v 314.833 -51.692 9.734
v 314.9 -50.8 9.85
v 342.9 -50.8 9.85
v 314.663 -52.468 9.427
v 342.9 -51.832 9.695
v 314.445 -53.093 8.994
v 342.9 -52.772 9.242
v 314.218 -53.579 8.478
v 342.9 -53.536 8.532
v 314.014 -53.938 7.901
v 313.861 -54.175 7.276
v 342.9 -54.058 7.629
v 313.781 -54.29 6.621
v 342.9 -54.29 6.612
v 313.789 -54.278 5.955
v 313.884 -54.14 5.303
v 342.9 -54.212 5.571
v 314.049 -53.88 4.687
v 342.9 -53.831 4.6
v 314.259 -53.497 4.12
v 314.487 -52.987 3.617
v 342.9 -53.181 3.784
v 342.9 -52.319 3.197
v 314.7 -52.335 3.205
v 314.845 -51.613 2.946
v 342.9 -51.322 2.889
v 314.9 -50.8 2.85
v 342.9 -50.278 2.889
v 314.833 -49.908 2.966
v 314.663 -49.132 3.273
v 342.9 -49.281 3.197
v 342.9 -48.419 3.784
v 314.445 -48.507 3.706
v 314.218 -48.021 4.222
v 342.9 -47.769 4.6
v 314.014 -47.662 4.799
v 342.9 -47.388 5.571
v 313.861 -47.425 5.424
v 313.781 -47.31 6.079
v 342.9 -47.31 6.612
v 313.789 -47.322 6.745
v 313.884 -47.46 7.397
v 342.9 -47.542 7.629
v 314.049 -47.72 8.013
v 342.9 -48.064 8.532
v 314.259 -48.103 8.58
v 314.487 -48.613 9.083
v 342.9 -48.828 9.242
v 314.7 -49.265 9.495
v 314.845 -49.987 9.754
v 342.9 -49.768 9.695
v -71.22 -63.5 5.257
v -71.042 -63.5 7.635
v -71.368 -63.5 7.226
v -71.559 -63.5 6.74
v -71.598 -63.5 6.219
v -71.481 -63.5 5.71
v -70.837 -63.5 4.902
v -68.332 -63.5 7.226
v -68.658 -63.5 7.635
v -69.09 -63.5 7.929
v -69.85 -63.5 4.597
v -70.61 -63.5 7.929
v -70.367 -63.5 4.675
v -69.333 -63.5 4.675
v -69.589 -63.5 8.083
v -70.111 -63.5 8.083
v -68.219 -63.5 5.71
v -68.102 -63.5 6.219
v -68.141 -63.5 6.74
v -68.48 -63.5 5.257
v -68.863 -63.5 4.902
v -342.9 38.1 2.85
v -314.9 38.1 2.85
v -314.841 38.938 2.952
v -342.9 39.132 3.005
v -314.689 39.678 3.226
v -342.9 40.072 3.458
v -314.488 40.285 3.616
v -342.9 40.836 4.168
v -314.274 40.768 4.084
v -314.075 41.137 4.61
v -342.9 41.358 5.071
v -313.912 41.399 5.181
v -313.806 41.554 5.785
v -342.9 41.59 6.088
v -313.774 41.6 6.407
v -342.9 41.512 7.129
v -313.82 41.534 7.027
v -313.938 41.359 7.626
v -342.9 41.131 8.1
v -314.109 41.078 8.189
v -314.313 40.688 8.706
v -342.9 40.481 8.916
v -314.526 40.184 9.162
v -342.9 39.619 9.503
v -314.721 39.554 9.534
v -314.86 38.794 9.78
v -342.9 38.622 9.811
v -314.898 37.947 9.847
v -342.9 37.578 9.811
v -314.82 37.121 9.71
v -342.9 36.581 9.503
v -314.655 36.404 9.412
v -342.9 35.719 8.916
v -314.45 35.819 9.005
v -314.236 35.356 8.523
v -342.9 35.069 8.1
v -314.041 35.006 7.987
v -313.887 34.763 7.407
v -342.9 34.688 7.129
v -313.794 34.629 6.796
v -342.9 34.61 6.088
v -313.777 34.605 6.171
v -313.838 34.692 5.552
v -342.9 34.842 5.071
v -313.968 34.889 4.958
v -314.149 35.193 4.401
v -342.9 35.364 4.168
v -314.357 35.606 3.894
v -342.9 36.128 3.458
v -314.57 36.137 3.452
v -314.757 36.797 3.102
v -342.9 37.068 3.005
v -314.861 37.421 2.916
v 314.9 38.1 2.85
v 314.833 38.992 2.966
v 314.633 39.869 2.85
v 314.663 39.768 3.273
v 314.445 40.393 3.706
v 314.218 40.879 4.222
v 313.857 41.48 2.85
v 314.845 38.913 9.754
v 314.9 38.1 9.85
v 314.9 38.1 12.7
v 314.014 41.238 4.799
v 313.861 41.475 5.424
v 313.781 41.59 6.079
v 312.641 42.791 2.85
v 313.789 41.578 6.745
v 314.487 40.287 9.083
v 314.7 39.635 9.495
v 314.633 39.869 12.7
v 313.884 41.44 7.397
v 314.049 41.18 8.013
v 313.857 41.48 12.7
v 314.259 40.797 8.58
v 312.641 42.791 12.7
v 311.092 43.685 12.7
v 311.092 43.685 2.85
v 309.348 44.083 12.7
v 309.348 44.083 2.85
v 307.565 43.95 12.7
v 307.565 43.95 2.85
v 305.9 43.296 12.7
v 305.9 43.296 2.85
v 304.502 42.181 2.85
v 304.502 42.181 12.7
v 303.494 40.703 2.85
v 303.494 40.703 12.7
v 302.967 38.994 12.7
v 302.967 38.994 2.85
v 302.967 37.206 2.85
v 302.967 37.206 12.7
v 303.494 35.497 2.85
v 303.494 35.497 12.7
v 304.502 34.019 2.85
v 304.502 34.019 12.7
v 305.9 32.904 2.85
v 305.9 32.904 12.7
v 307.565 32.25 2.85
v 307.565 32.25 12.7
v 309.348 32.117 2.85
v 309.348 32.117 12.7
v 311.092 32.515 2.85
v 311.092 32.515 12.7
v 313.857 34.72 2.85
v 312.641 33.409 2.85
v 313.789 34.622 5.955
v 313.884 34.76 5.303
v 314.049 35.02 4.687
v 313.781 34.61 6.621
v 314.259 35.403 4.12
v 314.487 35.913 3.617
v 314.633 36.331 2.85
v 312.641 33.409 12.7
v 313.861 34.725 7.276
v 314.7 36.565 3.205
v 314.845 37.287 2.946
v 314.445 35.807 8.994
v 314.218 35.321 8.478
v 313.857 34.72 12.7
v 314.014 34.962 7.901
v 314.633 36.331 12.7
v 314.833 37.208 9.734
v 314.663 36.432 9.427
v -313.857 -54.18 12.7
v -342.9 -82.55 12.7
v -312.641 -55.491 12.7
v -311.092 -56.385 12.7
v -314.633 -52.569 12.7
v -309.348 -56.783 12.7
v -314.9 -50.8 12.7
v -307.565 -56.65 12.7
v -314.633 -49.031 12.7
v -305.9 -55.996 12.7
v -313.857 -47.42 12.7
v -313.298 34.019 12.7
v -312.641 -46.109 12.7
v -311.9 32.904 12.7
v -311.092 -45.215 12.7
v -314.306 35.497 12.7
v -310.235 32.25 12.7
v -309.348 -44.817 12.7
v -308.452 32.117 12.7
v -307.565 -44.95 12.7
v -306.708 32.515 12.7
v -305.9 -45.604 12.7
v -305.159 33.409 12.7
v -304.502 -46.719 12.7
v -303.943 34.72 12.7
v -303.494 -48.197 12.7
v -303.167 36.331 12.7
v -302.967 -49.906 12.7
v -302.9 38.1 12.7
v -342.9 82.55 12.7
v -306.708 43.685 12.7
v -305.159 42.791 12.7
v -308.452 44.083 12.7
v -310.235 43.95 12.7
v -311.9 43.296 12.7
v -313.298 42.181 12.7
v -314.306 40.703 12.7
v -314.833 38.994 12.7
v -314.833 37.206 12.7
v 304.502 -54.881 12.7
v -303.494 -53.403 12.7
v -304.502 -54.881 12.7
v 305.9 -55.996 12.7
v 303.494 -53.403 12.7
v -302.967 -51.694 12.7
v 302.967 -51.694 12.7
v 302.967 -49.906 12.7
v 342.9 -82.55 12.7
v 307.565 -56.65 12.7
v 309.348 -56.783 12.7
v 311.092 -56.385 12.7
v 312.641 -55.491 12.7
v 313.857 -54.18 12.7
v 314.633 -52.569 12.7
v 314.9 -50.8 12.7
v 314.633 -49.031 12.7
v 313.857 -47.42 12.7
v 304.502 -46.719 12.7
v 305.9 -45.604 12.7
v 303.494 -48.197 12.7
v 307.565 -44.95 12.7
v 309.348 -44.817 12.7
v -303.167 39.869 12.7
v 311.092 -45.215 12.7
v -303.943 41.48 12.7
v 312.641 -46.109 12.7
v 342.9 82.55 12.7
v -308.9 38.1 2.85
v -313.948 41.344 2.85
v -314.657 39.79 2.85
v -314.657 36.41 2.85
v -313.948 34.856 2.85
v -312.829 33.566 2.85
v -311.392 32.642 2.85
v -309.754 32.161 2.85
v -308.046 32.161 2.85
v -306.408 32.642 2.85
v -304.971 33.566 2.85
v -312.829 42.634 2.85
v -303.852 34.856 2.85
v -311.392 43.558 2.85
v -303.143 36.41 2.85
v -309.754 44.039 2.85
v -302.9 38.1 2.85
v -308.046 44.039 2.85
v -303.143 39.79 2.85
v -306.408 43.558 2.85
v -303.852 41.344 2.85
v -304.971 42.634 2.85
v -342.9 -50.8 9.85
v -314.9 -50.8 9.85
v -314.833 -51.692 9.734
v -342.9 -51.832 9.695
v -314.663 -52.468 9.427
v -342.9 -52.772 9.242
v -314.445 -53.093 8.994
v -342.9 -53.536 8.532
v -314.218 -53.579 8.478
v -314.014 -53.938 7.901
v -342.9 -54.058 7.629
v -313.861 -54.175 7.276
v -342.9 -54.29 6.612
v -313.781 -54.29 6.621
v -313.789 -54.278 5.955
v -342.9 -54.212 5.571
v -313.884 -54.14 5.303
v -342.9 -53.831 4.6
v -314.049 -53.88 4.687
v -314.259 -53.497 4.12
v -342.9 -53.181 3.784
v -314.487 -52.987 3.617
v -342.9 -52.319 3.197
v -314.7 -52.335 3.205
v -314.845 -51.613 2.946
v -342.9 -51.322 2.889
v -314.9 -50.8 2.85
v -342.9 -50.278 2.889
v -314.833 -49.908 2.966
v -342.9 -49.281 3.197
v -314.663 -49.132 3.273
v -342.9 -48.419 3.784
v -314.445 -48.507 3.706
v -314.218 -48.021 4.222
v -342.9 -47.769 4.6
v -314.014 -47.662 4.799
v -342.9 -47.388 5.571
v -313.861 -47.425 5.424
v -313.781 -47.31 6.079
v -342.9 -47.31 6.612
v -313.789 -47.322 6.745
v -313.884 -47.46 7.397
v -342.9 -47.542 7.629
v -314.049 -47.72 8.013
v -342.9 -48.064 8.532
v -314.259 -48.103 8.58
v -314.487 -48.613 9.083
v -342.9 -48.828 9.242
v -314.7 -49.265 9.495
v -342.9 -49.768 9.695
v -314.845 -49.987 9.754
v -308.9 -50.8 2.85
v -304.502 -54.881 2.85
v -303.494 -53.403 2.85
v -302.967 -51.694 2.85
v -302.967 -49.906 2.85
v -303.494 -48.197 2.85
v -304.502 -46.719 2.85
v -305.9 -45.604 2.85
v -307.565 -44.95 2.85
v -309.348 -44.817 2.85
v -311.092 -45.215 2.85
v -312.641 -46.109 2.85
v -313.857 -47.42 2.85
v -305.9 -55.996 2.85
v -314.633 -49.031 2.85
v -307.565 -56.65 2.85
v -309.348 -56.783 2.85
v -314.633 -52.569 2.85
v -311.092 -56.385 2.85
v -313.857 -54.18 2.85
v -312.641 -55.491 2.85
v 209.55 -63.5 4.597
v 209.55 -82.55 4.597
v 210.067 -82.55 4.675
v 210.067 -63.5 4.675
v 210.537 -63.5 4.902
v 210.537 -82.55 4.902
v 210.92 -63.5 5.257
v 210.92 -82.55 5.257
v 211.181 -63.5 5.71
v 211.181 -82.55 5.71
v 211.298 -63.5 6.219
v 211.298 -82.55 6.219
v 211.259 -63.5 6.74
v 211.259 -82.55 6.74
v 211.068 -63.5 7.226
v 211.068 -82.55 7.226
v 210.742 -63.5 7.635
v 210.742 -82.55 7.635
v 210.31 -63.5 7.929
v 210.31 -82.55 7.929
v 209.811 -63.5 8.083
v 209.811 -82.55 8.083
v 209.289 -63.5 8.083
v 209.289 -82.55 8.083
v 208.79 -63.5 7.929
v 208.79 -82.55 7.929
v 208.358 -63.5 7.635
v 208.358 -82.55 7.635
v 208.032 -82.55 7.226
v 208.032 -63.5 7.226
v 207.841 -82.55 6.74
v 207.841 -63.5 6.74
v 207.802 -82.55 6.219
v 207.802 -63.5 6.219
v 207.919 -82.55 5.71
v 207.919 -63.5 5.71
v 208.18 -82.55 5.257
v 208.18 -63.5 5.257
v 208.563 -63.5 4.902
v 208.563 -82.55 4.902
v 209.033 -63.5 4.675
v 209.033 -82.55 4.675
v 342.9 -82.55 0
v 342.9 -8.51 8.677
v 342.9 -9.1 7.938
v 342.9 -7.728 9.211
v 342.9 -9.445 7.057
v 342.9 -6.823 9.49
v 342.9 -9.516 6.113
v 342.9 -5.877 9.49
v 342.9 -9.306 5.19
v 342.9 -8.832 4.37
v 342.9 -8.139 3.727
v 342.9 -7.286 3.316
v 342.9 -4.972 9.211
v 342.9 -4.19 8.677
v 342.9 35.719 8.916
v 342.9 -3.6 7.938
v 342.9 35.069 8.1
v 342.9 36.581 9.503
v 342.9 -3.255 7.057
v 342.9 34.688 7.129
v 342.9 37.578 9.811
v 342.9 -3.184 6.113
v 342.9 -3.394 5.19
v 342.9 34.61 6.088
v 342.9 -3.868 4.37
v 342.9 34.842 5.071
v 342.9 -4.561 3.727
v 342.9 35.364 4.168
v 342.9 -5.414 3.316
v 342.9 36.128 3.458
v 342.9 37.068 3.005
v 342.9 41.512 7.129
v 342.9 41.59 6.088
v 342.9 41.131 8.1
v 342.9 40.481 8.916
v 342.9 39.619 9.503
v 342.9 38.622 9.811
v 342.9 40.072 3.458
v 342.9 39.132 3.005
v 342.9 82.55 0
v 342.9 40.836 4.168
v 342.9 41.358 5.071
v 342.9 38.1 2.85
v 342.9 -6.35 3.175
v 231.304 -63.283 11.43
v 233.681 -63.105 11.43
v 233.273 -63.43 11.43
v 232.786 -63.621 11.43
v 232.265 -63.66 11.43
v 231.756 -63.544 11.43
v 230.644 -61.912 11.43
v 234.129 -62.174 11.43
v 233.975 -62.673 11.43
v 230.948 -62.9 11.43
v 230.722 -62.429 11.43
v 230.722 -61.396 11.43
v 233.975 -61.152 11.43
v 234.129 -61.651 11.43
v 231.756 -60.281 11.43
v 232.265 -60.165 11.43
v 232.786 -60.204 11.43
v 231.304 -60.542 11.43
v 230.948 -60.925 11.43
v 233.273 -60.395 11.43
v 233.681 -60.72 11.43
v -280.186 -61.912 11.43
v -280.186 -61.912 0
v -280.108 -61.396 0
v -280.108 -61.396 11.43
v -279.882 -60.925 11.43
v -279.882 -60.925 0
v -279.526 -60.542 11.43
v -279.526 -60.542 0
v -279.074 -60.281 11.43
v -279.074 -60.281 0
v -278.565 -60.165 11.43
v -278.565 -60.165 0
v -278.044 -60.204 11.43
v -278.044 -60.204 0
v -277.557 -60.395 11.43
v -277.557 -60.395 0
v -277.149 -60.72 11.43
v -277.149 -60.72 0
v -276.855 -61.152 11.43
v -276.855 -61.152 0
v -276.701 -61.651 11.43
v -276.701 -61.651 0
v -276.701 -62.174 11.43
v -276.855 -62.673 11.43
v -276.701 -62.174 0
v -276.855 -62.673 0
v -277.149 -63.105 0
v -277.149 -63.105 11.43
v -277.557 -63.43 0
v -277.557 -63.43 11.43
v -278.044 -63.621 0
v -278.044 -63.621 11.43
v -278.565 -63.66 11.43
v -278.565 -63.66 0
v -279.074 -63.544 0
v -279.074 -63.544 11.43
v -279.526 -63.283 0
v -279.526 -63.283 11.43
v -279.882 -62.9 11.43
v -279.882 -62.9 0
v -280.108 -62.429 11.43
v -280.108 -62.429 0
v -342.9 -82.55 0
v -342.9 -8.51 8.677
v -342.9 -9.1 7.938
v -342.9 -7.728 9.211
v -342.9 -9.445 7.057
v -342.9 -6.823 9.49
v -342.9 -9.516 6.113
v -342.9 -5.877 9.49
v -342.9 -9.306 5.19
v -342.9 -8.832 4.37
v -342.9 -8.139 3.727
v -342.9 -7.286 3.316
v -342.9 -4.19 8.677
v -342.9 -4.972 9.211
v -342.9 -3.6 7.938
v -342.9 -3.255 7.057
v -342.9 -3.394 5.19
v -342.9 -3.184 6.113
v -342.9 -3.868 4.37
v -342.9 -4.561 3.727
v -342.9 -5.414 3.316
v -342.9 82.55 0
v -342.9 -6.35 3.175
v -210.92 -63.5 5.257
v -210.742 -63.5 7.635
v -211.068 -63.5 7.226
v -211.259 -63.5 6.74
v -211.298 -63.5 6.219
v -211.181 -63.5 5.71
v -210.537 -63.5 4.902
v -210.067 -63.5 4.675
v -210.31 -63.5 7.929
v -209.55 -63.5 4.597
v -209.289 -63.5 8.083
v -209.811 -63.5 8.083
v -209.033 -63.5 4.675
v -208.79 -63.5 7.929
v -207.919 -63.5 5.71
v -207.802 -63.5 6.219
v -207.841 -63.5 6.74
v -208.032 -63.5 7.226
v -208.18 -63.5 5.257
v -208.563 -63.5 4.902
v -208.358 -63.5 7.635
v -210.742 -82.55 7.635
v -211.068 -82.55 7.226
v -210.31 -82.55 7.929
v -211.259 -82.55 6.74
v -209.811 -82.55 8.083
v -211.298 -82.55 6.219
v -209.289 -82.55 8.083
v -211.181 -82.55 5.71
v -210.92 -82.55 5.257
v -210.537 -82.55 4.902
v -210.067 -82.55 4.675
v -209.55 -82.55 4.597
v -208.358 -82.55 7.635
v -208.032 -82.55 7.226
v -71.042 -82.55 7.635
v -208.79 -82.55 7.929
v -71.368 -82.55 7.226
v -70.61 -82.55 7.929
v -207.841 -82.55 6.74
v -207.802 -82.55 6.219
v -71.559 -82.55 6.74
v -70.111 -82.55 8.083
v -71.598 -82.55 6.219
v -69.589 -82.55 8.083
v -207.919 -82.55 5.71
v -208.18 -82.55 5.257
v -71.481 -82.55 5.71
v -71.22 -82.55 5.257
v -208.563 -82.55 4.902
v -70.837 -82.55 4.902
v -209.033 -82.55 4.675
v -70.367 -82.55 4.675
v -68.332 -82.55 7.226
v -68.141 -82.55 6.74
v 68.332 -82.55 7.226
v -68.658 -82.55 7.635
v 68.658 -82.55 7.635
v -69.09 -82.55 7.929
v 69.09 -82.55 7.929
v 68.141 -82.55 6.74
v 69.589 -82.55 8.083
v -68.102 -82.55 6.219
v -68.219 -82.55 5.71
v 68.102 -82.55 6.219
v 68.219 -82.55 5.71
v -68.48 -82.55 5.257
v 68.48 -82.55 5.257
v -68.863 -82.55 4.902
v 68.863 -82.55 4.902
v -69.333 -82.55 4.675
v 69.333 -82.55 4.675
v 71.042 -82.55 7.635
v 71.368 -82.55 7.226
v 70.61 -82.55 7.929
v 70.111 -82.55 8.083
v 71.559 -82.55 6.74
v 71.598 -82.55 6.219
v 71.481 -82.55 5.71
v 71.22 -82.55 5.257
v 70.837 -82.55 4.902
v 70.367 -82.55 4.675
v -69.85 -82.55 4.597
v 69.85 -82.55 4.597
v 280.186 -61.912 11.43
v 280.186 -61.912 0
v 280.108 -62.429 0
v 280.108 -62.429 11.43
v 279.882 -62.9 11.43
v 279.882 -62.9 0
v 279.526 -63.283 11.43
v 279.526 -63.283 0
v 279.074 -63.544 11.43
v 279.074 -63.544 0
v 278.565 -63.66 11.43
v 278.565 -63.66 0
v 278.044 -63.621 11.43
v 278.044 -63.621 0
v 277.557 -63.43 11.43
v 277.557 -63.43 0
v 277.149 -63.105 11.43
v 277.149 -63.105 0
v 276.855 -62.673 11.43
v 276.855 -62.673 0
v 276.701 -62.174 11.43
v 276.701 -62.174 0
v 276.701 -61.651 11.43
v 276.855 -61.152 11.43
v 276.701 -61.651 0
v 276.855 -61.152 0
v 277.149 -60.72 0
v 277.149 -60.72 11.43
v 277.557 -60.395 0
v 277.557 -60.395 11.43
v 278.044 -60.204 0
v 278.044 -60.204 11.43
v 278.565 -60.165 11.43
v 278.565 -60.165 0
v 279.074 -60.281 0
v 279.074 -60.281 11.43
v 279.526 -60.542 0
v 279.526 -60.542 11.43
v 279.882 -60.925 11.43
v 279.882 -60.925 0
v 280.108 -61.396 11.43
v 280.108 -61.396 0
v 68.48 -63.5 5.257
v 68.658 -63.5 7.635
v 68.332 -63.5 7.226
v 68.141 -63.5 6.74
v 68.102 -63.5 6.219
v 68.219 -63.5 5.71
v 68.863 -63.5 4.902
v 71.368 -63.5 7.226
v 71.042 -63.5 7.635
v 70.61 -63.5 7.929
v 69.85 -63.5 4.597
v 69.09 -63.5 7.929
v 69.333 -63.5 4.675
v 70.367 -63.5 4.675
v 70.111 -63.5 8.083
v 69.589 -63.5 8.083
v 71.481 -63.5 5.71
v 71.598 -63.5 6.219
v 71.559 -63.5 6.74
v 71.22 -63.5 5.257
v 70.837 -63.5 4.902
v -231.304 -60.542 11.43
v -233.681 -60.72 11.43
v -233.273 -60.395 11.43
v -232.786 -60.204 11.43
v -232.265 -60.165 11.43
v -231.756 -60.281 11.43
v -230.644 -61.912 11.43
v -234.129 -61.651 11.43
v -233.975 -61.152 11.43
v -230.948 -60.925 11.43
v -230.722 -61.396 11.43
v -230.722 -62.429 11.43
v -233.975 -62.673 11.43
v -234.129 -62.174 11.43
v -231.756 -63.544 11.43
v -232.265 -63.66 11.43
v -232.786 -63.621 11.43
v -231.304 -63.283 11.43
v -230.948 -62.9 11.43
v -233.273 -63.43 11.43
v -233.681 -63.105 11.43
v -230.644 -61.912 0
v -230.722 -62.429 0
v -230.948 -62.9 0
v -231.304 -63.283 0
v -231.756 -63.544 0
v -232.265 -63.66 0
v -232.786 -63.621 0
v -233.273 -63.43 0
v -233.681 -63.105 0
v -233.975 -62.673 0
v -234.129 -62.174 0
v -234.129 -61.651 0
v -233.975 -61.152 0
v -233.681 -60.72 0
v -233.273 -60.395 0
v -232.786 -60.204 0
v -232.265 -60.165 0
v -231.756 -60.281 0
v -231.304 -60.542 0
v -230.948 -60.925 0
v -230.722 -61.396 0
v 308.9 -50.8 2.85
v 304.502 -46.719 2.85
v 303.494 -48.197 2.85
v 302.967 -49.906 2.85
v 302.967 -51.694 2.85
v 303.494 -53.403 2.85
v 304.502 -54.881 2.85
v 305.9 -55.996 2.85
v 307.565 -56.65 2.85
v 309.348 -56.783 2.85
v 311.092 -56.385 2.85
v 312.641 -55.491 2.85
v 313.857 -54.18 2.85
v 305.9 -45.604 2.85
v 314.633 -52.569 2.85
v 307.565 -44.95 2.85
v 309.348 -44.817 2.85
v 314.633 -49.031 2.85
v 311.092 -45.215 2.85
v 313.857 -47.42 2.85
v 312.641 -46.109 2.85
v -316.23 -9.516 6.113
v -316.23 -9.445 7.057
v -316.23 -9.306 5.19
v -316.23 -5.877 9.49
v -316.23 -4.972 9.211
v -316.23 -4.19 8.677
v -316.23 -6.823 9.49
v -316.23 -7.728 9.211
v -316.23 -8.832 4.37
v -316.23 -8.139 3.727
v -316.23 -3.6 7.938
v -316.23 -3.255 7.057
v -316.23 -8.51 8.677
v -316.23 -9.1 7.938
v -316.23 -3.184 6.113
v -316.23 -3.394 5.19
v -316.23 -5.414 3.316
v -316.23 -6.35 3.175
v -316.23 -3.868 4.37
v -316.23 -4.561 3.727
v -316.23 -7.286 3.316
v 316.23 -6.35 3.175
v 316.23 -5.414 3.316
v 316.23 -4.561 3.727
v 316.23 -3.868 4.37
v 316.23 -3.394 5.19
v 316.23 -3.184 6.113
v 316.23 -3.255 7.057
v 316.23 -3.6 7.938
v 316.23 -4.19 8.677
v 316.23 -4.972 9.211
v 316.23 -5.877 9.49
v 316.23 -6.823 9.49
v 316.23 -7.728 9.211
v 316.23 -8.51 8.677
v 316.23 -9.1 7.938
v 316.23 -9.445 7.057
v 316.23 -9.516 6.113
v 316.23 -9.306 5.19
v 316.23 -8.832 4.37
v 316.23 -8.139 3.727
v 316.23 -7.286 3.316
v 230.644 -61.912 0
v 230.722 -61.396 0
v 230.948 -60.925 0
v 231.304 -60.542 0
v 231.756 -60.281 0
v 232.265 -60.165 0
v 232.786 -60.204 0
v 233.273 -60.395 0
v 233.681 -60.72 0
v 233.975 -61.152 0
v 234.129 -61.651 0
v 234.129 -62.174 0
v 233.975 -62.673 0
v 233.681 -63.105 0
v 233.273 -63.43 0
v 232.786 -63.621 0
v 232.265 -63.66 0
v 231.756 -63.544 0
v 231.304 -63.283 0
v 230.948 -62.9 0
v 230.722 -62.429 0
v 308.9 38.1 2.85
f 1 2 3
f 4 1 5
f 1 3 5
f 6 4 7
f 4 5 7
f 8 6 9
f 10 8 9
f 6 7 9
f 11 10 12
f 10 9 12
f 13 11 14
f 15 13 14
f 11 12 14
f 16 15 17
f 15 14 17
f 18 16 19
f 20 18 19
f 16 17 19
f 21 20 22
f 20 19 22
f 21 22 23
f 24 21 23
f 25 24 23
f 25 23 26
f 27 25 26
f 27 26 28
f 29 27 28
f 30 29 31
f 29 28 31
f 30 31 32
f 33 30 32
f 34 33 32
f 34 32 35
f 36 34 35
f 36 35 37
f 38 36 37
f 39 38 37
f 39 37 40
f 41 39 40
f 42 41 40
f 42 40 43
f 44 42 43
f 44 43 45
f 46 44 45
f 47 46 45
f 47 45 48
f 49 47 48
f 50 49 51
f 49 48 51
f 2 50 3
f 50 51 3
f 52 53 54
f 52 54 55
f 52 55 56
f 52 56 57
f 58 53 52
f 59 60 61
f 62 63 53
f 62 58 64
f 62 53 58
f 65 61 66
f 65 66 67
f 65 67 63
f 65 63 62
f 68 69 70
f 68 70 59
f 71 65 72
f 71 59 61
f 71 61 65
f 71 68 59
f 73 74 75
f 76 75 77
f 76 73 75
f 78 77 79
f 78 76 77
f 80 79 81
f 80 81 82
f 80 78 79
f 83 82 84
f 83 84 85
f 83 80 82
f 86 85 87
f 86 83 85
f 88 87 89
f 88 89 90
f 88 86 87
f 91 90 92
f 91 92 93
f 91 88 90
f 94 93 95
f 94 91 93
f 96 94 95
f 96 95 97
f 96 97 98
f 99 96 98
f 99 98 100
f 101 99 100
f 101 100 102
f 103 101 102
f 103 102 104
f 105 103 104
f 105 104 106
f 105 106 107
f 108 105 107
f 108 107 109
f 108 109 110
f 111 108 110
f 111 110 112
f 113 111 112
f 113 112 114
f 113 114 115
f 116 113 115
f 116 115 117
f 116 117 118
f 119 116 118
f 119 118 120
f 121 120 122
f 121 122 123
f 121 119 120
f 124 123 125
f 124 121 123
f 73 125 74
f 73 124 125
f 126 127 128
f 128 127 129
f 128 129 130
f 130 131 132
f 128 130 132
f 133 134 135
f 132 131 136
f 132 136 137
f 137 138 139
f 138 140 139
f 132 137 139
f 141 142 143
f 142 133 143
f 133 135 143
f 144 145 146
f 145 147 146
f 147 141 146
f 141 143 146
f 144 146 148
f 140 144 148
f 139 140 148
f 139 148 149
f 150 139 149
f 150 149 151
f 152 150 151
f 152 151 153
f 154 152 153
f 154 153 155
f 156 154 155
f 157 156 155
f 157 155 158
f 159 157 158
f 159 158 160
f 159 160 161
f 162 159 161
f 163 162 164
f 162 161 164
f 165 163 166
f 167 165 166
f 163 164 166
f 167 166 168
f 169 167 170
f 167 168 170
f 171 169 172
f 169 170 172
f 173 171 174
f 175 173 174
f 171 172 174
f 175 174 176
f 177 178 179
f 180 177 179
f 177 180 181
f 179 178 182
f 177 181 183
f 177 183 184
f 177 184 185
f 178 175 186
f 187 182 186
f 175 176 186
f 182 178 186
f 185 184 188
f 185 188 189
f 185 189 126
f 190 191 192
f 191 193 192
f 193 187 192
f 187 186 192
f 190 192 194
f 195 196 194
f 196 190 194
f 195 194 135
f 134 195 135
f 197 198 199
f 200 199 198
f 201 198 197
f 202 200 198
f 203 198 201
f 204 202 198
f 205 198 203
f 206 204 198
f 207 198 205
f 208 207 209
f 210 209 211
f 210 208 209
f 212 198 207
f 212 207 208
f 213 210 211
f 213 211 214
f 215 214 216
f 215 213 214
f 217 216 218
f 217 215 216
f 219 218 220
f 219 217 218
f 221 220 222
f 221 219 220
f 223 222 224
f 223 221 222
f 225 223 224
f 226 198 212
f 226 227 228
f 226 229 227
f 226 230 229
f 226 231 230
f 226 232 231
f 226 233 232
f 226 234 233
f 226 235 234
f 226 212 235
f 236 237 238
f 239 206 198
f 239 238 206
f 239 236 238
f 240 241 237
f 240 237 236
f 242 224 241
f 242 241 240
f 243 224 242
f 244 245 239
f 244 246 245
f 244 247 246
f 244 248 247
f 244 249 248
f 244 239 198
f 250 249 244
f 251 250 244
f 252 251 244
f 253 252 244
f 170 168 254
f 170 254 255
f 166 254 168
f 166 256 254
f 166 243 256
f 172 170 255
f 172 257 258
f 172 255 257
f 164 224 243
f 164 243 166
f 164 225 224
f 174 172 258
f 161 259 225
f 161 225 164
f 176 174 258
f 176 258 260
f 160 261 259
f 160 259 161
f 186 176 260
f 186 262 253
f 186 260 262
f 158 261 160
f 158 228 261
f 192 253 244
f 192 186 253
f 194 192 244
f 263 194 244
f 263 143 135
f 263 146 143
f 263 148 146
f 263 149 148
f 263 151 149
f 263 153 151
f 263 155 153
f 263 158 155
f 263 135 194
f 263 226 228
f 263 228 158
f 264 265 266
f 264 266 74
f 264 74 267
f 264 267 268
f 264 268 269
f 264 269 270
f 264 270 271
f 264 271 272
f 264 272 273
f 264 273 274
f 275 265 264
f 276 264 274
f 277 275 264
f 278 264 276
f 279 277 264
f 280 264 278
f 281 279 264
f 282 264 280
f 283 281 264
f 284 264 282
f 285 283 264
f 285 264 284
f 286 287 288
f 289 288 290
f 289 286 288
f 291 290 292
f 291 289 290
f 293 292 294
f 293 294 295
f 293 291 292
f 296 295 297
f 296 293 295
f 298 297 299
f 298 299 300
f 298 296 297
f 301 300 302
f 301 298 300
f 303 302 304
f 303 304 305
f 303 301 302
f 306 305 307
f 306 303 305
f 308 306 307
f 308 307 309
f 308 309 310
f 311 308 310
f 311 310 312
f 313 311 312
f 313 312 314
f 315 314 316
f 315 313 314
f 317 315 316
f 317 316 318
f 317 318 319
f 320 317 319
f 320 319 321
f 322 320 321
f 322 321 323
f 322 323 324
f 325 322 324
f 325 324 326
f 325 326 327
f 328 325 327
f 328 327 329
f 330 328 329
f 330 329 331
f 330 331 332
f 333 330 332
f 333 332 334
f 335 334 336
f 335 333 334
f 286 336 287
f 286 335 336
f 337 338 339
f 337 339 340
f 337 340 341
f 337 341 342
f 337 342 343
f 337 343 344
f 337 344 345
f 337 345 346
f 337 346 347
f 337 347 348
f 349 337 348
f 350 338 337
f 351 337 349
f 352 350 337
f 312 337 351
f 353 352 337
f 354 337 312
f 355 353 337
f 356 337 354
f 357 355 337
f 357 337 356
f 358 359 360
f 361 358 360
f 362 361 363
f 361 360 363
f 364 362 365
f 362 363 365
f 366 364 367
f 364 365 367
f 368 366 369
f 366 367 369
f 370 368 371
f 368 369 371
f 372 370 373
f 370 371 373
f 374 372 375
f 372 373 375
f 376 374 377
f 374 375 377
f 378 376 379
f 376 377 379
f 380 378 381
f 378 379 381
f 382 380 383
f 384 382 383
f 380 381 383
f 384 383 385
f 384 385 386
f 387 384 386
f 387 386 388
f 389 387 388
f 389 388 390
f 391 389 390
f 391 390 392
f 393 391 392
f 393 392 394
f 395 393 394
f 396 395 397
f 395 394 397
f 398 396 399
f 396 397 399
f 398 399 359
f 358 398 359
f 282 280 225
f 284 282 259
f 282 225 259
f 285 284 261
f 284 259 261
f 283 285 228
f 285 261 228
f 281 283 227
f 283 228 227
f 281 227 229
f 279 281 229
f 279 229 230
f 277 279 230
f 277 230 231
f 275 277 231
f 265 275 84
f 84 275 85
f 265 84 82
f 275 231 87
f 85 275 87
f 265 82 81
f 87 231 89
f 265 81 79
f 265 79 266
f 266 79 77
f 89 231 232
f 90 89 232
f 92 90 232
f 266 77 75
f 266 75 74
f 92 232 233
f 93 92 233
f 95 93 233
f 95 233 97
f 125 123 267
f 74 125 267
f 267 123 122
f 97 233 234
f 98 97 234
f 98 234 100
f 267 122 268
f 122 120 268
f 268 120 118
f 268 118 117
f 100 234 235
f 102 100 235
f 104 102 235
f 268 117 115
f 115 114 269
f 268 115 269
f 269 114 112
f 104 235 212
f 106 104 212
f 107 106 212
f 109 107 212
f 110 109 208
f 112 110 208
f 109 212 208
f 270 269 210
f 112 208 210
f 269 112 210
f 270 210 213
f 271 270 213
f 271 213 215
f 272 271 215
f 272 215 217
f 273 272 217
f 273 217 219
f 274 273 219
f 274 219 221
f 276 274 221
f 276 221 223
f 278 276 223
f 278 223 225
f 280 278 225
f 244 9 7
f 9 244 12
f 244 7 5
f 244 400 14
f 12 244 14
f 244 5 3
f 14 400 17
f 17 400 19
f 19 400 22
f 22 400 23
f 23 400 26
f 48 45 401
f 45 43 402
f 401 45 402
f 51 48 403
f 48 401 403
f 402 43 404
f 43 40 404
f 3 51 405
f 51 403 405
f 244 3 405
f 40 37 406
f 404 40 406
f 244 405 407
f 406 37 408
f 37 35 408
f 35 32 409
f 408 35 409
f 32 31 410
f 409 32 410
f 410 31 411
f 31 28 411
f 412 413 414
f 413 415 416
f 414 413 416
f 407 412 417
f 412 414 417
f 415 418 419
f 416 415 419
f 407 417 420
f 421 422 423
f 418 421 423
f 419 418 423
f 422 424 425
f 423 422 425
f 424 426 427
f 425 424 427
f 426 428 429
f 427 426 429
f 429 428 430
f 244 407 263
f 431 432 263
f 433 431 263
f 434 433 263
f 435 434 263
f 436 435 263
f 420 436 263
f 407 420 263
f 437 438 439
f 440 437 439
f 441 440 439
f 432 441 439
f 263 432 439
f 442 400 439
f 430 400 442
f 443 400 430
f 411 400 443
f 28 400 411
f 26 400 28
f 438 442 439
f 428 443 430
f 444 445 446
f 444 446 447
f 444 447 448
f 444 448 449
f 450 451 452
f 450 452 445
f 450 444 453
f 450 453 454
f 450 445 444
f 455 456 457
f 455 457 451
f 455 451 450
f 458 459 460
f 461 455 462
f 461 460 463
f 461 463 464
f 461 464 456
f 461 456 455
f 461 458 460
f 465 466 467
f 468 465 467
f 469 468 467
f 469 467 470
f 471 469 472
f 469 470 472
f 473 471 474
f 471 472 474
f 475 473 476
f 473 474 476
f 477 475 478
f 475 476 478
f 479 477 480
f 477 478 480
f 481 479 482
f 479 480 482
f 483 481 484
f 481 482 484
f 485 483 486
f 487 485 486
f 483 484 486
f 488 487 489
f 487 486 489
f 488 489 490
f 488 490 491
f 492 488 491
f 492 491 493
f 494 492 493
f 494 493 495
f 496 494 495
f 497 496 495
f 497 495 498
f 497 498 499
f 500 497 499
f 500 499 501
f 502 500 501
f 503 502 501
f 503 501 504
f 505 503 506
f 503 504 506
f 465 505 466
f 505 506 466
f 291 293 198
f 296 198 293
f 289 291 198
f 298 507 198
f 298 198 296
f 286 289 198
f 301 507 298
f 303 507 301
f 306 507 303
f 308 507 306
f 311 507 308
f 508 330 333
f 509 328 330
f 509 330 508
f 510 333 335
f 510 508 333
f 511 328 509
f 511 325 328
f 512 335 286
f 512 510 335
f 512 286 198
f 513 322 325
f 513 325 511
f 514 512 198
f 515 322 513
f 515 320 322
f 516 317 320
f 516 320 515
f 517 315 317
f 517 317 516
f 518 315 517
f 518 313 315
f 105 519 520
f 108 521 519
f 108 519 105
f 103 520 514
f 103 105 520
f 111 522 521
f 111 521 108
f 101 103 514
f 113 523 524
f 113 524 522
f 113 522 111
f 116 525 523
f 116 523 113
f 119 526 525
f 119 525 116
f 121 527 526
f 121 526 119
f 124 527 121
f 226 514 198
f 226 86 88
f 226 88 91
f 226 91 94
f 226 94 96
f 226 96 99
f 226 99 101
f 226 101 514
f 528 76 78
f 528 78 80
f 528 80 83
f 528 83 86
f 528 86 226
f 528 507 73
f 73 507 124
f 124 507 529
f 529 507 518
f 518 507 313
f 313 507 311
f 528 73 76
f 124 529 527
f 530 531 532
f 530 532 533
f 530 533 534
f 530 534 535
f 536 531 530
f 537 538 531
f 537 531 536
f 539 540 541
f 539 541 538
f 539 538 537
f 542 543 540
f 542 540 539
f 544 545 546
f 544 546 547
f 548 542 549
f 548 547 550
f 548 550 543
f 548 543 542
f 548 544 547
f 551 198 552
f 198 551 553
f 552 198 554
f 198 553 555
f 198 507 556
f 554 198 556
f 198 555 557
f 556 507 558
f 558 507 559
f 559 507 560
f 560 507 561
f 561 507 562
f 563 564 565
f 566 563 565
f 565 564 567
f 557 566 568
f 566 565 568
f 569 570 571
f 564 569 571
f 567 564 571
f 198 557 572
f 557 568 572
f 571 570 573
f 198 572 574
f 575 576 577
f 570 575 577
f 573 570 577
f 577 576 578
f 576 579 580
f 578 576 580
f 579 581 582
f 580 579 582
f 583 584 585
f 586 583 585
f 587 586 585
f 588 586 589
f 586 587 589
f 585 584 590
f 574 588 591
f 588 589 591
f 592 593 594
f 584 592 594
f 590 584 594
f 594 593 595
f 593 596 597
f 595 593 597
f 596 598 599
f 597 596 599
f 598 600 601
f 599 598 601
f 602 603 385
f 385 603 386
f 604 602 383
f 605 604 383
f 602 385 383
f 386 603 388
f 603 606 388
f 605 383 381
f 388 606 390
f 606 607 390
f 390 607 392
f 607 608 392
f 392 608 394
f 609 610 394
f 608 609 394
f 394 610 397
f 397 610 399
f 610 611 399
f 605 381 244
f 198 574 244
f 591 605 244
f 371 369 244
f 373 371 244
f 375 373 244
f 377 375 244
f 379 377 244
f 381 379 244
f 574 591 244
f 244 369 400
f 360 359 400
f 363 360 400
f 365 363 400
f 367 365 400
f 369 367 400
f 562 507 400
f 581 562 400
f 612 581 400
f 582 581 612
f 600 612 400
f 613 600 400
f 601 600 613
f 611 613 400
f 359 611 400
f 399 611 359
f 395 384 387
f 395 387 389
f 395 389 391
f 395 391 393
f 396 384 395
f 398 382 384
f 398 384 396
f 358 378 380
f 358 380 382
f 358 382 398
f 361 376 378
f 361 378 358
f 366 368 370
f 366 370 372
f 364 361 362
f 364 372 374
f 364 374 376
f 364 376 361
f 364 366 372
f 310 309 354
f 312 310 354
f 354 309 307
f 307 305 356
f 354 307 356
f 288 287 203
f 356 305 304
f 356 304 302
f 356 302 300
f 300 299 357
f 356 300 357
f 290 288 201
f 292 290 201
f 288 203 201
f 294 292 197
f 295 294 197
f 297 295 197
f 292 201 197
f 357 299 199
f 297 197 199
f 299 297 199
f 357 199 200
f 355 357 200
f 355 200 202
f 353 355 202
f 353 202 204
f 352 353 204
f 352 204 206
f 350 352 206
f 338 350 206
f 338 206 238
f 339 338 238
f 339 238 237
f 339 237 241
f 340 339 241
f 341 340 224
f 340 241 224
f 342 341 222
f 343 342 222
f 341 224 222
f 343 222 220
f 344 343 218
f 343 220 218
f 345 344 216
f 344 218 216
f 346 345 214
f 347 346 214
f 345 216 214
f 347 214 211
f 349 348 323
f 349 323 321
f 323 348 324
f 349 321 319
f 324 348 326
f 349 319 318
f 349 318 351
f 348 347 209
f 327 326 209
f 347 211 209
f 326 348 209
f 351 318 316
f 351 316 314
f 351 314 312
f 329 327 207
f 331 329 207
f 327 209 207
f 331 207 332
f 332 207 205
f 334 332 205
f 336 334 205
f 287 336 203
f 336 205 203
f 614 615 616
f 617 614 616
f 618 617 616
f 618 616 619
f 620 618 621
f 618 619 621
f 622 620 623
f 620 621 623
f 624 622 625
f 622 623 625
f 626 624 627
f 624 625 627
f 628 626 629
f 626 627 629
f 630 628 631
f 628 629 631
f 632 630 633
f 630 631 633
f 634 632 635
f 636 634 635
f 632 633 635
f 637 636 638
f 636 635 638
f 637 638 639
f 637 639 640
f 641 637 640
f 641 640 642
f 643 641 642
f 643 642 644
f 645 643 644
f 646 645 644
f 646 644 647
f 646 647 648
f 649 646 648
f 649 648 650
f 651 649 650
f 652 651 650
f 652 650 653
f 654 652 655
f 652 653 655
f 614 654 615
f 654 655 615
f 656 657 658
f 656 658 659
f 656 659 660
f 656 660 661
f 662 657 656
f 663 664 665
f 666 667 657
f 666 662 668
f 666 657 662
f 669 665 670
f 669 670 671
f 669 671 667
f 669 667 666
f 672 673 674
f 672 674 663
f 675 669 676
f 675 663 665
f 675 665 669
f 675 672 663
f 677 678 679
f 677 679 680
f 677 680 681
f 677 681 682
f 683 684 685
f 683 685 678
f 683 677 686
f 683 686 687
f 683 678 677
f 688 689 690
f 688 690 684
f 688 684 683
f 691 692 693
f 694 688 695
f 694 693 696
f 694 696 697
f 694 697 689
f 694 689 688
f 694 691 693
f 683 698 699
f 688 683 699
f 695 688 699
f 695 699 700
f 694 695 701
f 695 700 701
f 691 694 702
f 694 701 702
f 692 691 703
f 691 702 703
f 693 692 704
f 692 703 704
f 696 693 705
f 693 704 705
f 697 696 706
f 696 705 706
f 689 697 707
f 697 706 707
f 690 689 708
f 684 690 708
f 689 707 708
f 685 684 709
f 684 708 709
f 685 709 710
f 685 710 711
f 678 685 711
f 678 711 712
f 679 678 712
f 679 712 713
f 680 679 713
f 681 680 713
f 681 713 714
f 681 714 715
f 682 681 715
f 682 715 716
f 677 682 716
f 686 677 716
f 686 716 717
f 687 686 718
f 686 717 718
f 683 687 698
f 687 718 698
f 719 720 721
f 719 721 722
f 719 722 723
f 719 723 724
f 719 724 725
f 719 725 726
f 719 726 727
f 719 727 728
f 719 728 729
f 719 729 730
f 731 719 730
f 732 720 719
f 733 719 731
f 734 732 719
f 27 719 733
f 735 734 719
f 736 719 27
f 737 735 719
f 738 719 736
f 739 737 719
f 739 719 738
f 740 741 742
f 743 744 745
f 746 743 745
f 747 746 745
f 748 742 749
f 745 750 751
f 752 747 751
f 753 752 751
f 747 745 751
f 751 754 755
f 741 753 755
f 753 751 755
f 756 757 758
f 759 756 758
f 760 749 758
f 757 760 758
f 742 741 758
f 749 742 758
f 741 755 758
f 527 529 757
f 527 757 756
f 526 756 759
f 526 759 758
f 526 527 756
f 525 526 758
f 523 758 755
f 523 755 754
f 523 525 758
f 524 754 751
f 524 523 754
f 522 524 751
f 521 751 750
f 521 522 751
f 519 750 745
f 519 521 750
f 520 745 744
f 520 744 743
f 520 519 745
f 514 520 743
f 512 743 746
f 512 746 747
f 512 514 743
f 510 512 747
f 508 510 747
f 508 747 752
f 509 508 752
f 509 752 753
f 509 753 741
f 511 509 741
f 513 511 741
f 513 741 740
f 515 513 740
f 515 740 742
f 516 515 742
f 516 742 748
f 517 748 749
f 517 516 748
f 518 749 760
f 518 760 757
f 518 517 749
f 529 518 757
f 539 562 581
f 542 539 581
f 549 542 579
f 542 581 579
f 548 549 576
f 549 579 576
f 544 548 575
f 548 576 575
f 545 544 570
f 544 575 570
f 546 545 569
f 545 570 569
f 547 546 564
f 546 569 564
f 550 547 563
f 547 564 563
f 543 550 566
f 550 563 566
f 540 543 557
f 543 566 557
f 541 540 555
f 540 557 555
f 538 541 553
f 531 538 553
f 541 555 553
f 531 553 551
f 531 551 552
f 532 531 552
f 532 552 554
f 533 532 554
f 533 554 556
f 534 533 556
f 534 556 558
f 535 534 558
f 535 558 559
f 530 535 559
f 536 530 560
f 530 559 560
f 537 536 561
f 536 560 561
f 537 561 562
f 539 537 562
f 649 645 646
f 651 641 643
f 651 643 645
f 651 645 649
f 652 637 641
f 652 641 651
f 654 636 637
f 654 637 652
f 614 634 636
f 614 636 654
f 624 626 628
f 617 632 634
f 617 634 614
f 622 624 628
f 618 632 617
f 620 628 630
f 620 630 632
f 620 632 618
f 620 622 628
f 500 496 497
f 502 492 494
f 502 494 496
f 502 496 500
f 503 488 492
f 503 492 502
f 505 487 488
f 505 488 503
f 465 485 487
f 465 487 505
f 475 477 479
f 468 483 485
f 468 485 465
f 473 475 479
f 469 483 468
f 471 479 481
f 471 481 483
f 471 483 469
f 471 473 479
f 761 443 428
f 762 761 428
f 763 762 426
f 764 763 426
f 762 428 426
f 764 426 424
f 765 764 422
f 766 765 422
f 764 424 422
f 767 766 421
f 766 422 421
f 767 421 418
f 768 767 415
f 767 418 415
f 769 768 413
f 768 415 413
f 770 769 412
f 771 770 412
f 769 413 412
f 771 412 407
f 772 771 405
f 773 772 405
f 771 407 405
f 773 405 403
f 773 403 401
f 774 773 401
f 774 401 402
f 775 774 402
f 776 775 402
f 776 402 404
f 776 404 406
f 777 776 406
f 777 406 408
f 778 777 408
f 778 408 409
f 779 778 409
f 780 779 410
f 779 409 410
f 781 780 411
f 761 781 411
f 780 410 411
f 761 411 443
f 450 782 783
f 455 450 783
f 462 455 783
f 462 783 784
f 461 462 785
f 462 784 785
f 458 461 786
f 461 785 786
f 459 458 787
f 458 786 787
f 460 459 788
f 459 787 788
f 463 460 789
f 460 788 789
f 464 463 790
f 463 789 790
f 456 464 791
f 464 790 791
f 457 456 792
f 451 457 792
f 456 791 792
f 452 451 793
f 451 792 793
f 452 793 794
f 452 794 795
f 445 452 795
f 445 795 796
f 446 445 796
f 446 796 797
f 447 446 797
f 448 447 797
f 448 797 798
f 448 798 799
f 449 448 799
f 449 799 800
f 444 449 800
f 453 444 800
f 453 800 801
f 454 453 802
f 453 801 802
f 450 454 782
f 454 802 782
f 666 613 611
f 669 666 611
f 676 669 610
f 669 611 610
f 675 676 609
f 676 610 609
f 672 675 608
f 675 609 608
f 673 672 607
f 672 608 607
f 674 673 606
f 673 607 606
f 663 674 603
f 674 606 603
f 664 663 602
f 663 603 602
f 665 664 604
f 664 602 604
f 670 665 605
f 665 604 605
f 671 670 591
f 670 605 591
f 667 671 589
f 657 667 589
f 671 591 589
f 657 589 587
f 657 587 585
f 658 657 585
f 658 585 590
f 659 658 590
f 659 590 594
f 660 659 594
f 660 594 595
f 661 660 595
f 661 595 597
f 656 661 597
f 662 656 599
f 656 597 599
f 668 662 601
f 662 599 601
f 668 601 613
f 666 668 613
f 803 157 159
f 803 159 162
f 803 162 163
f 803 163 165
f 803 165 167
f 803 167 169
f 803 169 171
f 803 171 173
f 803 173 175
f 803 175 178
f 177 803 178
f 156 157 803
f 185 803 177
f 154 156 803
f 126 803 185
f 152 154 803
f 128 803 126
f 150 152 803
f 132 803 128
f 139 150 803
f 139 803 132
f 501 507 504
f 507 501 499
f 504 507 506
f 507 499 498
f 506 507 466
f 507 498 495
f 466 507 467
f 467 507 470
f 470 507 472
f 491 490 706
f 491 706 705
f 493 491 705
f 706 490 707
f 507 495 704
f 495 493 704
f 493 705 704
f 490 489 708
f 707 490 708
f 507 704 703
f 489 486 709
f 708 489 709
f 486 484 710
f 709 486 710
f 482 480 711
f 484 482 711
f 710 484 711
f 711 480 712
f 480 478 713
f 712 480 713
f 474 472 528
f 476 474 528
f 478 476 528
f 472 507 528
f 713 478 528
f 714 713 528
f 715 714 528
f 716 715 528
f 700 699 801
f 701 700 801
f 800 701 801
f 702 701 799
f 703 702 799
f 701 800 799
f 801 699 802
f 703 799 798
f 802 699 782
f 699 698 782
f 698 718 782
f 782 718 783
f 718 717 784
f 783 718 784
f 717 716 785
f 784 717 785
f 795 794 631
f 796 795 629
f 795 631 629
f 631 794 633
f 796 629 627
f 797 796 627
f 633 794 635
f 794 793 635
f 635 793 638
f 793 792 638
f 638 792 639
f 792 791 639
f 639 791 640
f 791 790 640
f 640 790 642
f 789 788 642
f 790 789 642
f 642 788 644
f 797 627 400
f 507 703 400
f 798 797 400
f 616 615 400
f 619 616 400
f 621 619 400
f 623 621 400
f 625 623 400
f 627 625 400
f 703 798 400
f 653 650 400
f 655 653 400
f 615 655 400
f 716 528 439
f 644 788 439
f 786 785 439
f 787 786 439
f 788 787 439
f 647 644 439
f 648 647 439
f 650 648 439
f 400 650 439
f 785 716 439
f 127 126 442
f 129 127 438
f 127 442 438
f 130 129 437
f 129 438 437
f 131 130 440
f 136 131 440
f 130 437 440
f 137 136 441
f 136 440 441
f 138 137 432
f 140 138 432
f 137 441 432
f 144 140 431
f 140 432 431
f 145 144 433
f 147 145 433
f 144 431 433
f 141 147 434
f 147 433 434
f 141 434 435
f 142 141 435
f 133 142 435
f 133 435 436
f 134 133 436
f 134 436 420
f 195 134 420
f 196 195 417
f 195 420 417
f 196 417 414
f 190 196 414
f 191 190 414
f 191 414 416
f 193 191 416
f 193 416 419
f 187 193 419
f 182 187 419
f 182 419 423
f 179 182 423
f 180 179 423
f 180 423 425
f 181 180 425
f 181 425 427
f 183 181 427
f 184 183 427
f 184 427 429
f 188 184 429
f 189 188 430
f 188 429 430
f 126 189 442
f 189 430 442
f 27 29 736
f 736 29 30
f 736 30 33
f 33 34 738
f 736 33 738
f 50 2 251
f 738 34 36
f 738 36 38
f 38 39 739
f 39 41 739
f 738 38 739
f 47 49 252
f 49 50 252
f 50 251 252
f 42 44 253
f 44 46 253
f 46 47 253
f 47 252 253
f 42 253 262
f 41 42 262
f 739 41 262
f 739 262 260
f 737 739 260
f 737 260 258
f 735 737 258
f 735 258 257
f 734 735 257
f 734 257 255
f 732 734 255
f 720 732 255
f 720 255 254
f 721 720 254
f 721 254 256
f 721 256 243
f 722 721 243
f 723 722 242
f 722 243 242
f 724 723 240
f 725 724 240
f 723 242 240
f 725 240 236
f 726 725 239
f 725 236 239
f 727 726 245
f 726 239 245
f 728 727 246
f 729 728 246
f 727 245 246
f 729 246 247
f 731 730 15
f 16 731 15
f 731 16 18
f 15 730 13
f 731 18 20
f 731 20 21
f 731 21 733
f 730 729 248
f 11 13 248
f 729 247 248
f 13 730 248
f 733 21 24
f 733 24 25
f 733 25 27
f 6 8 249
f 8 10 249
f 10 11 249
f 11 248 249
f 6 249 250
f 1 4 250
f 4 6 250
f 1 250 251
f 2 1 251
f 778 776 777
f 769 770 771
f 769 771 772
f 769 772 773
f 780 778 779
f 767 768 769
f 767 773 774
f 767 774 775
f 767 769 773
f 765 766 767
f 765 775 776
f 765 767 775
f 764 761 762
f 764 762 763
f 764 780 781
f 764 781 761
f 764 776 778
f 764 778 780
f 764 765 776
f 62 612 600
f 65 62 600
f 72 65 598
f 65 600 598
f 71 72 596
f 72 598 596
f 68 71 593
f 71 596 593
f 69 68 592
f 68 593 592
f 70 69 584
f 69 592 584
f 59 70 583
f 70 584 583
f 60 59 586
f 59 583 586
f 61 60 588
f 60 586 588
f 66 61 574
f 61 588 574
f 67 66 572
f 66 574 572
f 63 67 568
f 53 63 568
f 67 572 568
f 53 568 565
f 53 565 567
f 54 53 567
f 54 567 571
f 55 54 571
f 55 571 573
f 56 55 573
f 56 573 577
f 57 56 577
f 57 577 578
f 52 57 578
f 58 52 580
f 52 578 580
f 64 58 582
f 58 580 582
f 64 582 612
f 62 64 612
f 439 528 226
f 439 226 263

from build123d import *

# Parameters (mm, degrees)
SKETCH1_W           = 685.8
SKETCH1_H           = 165.1
BOSS_EXTRUDE1_DEPTH = 12.7
SKETCH2_R           = 3.175
CUT_EXTRUDE1_DEPTH  = 26.67
SKETCH3_R           = 3.5
CUT_EXTRUDE2_DEPTH  = 34
SKETCH4_R           = 6
CUT_EXTRUDE3_DEPTH  = 9.85
SKETCH5_R           = 1.7526
CUT_EXTRUDE4_DEPTH  = 19.05
SKETCH7_R           = 1.7526
CUT_EXTRUDE5_DEPTH  = 11.43


with BuildPart() as part:
    # Sketch1 → Boss-Extrude1 (new body)
    with BuildSketch(Plane.XY):
        Rectangle(SKETCH1_W, SKETCH1_H)
    extrude(amount=BOSS_EXTRUDE1_DEPTH)

    # Sketch2 → Cut-Extrude1 (cut)
    with BuildSketch(Plane(origin=(342.9, 0, 0), x_dir=(0, 0, -1), z_dir=(1, 0, 0))):
        with Locations((-6.35, -6.35)):
            Circle(SKETCH2_R)
    cut_extrude1 = extrude(amount=-CUT_EXTRUDE1_DEPTH, mode=Mode.SUBTRACT)

    # Sketch3 → Cut-Extrude2 (cut)
    with BuildSketch(Plane(origin=(342.9, 0, 0), x_dir=(0, 0, -1), z_dir=(1, 0, 0))):
        with Locations((-6.35, 38.1)):
            Circle(SKETCH3_R)
        with Locations(Location((-6.35, -50.8, 0), (0, 0, 180))):
            Circle(SKETCH3_R)
    cut_extrude2 = extrude(amount=-CUT_EXTRUDE2_DEPTH, mode=Mode.SUBTRACT)

    # Mirror2: Cut-Extrude1, Cut-Extrude2 across plane
    add(cut_extrude1.mirror(Plane(origin=(0, 0, 0), x_dir=(0, 0, 1), z_dir=(1, 0, 0))), mode=Mode.SUBTRACT)
    add(cut_extrude2.mirror(Plane(origin=(0, 0, 0), x_dir=(0, 0, 1), z_dir=(1, 0, 0))), mode=Mode.SUBTRACT)

    # Sketch4 → Cut-Extrude3 (cut)
    with BuildSketch(Plane.XY.offset(12.7)):
        with Locations((-308.9, 38.1)):
            Circle(SKETCH4_R)
        with Locations((308.9, -50.8)):
            Circle(SKETCH4_R)
        with Locations(Location((-308.9, -50.8, 0), (0, 0, 179.999999983))):
            Circle(SKETCH4_R)
        with Locations((308.9, 38.1)):
            Circle(SKETCH4_R)
    extrude(amount=-CUT_EXTRUDE3_DEPTH, mode=Mode.SUBTRACT)

    # Sketch5 → Cut-Extrude4 (cut)
    with BuildSketch(Plane.XZ.offset(82.55)):
        with Locations(Location((-209.55, 6.35, 0), (0, 0, 270))):
            Circle(SKETCH5_R)
        with Locations(Location((-69.85, 6.35, 0), (0, 0, 270))):
            Circle(SKETCH5_R)
        with Locations(Location((69.85, 6.35, 0), (0, 0, 270))):
            Circle(SKETCH5_R)
        with Locations(Location((209.55, 6.35, 0), (0, 0, 270))):
            Circle(SKETCH5_R)
    extrude(amount=-CUT_EXTRUDE4_DEPTH, mode=Mode.SUBTRACT)

    # Sketch7 → Cut-Extrude5 (cut)
    with BuildSketch(Plane(origin=(0, 0, 0), x_dir=(-1, 0, 0), z_dir=(0, 0, -1))):
        with Locations((278.43375, -61.9125)):
            Circle(SKETCH7_R)
        with Locations(Location((232.39625, -61.9125, 0), (0, 0, 180))):
            Circle(SKETCH7_R)
        with Locations((-232.39625, -61.9125)):
            Circle(SKETCH7_R)
        with Locations(Location((-278.43375, -61.9125, 0), (0, 0, 180))):
            Circle(SKETCH7_R)
    extrude(amount=-CUT_EXTRUDE5_DEPTH, mode=Mode.SUBTRACT)


solid = part.part
